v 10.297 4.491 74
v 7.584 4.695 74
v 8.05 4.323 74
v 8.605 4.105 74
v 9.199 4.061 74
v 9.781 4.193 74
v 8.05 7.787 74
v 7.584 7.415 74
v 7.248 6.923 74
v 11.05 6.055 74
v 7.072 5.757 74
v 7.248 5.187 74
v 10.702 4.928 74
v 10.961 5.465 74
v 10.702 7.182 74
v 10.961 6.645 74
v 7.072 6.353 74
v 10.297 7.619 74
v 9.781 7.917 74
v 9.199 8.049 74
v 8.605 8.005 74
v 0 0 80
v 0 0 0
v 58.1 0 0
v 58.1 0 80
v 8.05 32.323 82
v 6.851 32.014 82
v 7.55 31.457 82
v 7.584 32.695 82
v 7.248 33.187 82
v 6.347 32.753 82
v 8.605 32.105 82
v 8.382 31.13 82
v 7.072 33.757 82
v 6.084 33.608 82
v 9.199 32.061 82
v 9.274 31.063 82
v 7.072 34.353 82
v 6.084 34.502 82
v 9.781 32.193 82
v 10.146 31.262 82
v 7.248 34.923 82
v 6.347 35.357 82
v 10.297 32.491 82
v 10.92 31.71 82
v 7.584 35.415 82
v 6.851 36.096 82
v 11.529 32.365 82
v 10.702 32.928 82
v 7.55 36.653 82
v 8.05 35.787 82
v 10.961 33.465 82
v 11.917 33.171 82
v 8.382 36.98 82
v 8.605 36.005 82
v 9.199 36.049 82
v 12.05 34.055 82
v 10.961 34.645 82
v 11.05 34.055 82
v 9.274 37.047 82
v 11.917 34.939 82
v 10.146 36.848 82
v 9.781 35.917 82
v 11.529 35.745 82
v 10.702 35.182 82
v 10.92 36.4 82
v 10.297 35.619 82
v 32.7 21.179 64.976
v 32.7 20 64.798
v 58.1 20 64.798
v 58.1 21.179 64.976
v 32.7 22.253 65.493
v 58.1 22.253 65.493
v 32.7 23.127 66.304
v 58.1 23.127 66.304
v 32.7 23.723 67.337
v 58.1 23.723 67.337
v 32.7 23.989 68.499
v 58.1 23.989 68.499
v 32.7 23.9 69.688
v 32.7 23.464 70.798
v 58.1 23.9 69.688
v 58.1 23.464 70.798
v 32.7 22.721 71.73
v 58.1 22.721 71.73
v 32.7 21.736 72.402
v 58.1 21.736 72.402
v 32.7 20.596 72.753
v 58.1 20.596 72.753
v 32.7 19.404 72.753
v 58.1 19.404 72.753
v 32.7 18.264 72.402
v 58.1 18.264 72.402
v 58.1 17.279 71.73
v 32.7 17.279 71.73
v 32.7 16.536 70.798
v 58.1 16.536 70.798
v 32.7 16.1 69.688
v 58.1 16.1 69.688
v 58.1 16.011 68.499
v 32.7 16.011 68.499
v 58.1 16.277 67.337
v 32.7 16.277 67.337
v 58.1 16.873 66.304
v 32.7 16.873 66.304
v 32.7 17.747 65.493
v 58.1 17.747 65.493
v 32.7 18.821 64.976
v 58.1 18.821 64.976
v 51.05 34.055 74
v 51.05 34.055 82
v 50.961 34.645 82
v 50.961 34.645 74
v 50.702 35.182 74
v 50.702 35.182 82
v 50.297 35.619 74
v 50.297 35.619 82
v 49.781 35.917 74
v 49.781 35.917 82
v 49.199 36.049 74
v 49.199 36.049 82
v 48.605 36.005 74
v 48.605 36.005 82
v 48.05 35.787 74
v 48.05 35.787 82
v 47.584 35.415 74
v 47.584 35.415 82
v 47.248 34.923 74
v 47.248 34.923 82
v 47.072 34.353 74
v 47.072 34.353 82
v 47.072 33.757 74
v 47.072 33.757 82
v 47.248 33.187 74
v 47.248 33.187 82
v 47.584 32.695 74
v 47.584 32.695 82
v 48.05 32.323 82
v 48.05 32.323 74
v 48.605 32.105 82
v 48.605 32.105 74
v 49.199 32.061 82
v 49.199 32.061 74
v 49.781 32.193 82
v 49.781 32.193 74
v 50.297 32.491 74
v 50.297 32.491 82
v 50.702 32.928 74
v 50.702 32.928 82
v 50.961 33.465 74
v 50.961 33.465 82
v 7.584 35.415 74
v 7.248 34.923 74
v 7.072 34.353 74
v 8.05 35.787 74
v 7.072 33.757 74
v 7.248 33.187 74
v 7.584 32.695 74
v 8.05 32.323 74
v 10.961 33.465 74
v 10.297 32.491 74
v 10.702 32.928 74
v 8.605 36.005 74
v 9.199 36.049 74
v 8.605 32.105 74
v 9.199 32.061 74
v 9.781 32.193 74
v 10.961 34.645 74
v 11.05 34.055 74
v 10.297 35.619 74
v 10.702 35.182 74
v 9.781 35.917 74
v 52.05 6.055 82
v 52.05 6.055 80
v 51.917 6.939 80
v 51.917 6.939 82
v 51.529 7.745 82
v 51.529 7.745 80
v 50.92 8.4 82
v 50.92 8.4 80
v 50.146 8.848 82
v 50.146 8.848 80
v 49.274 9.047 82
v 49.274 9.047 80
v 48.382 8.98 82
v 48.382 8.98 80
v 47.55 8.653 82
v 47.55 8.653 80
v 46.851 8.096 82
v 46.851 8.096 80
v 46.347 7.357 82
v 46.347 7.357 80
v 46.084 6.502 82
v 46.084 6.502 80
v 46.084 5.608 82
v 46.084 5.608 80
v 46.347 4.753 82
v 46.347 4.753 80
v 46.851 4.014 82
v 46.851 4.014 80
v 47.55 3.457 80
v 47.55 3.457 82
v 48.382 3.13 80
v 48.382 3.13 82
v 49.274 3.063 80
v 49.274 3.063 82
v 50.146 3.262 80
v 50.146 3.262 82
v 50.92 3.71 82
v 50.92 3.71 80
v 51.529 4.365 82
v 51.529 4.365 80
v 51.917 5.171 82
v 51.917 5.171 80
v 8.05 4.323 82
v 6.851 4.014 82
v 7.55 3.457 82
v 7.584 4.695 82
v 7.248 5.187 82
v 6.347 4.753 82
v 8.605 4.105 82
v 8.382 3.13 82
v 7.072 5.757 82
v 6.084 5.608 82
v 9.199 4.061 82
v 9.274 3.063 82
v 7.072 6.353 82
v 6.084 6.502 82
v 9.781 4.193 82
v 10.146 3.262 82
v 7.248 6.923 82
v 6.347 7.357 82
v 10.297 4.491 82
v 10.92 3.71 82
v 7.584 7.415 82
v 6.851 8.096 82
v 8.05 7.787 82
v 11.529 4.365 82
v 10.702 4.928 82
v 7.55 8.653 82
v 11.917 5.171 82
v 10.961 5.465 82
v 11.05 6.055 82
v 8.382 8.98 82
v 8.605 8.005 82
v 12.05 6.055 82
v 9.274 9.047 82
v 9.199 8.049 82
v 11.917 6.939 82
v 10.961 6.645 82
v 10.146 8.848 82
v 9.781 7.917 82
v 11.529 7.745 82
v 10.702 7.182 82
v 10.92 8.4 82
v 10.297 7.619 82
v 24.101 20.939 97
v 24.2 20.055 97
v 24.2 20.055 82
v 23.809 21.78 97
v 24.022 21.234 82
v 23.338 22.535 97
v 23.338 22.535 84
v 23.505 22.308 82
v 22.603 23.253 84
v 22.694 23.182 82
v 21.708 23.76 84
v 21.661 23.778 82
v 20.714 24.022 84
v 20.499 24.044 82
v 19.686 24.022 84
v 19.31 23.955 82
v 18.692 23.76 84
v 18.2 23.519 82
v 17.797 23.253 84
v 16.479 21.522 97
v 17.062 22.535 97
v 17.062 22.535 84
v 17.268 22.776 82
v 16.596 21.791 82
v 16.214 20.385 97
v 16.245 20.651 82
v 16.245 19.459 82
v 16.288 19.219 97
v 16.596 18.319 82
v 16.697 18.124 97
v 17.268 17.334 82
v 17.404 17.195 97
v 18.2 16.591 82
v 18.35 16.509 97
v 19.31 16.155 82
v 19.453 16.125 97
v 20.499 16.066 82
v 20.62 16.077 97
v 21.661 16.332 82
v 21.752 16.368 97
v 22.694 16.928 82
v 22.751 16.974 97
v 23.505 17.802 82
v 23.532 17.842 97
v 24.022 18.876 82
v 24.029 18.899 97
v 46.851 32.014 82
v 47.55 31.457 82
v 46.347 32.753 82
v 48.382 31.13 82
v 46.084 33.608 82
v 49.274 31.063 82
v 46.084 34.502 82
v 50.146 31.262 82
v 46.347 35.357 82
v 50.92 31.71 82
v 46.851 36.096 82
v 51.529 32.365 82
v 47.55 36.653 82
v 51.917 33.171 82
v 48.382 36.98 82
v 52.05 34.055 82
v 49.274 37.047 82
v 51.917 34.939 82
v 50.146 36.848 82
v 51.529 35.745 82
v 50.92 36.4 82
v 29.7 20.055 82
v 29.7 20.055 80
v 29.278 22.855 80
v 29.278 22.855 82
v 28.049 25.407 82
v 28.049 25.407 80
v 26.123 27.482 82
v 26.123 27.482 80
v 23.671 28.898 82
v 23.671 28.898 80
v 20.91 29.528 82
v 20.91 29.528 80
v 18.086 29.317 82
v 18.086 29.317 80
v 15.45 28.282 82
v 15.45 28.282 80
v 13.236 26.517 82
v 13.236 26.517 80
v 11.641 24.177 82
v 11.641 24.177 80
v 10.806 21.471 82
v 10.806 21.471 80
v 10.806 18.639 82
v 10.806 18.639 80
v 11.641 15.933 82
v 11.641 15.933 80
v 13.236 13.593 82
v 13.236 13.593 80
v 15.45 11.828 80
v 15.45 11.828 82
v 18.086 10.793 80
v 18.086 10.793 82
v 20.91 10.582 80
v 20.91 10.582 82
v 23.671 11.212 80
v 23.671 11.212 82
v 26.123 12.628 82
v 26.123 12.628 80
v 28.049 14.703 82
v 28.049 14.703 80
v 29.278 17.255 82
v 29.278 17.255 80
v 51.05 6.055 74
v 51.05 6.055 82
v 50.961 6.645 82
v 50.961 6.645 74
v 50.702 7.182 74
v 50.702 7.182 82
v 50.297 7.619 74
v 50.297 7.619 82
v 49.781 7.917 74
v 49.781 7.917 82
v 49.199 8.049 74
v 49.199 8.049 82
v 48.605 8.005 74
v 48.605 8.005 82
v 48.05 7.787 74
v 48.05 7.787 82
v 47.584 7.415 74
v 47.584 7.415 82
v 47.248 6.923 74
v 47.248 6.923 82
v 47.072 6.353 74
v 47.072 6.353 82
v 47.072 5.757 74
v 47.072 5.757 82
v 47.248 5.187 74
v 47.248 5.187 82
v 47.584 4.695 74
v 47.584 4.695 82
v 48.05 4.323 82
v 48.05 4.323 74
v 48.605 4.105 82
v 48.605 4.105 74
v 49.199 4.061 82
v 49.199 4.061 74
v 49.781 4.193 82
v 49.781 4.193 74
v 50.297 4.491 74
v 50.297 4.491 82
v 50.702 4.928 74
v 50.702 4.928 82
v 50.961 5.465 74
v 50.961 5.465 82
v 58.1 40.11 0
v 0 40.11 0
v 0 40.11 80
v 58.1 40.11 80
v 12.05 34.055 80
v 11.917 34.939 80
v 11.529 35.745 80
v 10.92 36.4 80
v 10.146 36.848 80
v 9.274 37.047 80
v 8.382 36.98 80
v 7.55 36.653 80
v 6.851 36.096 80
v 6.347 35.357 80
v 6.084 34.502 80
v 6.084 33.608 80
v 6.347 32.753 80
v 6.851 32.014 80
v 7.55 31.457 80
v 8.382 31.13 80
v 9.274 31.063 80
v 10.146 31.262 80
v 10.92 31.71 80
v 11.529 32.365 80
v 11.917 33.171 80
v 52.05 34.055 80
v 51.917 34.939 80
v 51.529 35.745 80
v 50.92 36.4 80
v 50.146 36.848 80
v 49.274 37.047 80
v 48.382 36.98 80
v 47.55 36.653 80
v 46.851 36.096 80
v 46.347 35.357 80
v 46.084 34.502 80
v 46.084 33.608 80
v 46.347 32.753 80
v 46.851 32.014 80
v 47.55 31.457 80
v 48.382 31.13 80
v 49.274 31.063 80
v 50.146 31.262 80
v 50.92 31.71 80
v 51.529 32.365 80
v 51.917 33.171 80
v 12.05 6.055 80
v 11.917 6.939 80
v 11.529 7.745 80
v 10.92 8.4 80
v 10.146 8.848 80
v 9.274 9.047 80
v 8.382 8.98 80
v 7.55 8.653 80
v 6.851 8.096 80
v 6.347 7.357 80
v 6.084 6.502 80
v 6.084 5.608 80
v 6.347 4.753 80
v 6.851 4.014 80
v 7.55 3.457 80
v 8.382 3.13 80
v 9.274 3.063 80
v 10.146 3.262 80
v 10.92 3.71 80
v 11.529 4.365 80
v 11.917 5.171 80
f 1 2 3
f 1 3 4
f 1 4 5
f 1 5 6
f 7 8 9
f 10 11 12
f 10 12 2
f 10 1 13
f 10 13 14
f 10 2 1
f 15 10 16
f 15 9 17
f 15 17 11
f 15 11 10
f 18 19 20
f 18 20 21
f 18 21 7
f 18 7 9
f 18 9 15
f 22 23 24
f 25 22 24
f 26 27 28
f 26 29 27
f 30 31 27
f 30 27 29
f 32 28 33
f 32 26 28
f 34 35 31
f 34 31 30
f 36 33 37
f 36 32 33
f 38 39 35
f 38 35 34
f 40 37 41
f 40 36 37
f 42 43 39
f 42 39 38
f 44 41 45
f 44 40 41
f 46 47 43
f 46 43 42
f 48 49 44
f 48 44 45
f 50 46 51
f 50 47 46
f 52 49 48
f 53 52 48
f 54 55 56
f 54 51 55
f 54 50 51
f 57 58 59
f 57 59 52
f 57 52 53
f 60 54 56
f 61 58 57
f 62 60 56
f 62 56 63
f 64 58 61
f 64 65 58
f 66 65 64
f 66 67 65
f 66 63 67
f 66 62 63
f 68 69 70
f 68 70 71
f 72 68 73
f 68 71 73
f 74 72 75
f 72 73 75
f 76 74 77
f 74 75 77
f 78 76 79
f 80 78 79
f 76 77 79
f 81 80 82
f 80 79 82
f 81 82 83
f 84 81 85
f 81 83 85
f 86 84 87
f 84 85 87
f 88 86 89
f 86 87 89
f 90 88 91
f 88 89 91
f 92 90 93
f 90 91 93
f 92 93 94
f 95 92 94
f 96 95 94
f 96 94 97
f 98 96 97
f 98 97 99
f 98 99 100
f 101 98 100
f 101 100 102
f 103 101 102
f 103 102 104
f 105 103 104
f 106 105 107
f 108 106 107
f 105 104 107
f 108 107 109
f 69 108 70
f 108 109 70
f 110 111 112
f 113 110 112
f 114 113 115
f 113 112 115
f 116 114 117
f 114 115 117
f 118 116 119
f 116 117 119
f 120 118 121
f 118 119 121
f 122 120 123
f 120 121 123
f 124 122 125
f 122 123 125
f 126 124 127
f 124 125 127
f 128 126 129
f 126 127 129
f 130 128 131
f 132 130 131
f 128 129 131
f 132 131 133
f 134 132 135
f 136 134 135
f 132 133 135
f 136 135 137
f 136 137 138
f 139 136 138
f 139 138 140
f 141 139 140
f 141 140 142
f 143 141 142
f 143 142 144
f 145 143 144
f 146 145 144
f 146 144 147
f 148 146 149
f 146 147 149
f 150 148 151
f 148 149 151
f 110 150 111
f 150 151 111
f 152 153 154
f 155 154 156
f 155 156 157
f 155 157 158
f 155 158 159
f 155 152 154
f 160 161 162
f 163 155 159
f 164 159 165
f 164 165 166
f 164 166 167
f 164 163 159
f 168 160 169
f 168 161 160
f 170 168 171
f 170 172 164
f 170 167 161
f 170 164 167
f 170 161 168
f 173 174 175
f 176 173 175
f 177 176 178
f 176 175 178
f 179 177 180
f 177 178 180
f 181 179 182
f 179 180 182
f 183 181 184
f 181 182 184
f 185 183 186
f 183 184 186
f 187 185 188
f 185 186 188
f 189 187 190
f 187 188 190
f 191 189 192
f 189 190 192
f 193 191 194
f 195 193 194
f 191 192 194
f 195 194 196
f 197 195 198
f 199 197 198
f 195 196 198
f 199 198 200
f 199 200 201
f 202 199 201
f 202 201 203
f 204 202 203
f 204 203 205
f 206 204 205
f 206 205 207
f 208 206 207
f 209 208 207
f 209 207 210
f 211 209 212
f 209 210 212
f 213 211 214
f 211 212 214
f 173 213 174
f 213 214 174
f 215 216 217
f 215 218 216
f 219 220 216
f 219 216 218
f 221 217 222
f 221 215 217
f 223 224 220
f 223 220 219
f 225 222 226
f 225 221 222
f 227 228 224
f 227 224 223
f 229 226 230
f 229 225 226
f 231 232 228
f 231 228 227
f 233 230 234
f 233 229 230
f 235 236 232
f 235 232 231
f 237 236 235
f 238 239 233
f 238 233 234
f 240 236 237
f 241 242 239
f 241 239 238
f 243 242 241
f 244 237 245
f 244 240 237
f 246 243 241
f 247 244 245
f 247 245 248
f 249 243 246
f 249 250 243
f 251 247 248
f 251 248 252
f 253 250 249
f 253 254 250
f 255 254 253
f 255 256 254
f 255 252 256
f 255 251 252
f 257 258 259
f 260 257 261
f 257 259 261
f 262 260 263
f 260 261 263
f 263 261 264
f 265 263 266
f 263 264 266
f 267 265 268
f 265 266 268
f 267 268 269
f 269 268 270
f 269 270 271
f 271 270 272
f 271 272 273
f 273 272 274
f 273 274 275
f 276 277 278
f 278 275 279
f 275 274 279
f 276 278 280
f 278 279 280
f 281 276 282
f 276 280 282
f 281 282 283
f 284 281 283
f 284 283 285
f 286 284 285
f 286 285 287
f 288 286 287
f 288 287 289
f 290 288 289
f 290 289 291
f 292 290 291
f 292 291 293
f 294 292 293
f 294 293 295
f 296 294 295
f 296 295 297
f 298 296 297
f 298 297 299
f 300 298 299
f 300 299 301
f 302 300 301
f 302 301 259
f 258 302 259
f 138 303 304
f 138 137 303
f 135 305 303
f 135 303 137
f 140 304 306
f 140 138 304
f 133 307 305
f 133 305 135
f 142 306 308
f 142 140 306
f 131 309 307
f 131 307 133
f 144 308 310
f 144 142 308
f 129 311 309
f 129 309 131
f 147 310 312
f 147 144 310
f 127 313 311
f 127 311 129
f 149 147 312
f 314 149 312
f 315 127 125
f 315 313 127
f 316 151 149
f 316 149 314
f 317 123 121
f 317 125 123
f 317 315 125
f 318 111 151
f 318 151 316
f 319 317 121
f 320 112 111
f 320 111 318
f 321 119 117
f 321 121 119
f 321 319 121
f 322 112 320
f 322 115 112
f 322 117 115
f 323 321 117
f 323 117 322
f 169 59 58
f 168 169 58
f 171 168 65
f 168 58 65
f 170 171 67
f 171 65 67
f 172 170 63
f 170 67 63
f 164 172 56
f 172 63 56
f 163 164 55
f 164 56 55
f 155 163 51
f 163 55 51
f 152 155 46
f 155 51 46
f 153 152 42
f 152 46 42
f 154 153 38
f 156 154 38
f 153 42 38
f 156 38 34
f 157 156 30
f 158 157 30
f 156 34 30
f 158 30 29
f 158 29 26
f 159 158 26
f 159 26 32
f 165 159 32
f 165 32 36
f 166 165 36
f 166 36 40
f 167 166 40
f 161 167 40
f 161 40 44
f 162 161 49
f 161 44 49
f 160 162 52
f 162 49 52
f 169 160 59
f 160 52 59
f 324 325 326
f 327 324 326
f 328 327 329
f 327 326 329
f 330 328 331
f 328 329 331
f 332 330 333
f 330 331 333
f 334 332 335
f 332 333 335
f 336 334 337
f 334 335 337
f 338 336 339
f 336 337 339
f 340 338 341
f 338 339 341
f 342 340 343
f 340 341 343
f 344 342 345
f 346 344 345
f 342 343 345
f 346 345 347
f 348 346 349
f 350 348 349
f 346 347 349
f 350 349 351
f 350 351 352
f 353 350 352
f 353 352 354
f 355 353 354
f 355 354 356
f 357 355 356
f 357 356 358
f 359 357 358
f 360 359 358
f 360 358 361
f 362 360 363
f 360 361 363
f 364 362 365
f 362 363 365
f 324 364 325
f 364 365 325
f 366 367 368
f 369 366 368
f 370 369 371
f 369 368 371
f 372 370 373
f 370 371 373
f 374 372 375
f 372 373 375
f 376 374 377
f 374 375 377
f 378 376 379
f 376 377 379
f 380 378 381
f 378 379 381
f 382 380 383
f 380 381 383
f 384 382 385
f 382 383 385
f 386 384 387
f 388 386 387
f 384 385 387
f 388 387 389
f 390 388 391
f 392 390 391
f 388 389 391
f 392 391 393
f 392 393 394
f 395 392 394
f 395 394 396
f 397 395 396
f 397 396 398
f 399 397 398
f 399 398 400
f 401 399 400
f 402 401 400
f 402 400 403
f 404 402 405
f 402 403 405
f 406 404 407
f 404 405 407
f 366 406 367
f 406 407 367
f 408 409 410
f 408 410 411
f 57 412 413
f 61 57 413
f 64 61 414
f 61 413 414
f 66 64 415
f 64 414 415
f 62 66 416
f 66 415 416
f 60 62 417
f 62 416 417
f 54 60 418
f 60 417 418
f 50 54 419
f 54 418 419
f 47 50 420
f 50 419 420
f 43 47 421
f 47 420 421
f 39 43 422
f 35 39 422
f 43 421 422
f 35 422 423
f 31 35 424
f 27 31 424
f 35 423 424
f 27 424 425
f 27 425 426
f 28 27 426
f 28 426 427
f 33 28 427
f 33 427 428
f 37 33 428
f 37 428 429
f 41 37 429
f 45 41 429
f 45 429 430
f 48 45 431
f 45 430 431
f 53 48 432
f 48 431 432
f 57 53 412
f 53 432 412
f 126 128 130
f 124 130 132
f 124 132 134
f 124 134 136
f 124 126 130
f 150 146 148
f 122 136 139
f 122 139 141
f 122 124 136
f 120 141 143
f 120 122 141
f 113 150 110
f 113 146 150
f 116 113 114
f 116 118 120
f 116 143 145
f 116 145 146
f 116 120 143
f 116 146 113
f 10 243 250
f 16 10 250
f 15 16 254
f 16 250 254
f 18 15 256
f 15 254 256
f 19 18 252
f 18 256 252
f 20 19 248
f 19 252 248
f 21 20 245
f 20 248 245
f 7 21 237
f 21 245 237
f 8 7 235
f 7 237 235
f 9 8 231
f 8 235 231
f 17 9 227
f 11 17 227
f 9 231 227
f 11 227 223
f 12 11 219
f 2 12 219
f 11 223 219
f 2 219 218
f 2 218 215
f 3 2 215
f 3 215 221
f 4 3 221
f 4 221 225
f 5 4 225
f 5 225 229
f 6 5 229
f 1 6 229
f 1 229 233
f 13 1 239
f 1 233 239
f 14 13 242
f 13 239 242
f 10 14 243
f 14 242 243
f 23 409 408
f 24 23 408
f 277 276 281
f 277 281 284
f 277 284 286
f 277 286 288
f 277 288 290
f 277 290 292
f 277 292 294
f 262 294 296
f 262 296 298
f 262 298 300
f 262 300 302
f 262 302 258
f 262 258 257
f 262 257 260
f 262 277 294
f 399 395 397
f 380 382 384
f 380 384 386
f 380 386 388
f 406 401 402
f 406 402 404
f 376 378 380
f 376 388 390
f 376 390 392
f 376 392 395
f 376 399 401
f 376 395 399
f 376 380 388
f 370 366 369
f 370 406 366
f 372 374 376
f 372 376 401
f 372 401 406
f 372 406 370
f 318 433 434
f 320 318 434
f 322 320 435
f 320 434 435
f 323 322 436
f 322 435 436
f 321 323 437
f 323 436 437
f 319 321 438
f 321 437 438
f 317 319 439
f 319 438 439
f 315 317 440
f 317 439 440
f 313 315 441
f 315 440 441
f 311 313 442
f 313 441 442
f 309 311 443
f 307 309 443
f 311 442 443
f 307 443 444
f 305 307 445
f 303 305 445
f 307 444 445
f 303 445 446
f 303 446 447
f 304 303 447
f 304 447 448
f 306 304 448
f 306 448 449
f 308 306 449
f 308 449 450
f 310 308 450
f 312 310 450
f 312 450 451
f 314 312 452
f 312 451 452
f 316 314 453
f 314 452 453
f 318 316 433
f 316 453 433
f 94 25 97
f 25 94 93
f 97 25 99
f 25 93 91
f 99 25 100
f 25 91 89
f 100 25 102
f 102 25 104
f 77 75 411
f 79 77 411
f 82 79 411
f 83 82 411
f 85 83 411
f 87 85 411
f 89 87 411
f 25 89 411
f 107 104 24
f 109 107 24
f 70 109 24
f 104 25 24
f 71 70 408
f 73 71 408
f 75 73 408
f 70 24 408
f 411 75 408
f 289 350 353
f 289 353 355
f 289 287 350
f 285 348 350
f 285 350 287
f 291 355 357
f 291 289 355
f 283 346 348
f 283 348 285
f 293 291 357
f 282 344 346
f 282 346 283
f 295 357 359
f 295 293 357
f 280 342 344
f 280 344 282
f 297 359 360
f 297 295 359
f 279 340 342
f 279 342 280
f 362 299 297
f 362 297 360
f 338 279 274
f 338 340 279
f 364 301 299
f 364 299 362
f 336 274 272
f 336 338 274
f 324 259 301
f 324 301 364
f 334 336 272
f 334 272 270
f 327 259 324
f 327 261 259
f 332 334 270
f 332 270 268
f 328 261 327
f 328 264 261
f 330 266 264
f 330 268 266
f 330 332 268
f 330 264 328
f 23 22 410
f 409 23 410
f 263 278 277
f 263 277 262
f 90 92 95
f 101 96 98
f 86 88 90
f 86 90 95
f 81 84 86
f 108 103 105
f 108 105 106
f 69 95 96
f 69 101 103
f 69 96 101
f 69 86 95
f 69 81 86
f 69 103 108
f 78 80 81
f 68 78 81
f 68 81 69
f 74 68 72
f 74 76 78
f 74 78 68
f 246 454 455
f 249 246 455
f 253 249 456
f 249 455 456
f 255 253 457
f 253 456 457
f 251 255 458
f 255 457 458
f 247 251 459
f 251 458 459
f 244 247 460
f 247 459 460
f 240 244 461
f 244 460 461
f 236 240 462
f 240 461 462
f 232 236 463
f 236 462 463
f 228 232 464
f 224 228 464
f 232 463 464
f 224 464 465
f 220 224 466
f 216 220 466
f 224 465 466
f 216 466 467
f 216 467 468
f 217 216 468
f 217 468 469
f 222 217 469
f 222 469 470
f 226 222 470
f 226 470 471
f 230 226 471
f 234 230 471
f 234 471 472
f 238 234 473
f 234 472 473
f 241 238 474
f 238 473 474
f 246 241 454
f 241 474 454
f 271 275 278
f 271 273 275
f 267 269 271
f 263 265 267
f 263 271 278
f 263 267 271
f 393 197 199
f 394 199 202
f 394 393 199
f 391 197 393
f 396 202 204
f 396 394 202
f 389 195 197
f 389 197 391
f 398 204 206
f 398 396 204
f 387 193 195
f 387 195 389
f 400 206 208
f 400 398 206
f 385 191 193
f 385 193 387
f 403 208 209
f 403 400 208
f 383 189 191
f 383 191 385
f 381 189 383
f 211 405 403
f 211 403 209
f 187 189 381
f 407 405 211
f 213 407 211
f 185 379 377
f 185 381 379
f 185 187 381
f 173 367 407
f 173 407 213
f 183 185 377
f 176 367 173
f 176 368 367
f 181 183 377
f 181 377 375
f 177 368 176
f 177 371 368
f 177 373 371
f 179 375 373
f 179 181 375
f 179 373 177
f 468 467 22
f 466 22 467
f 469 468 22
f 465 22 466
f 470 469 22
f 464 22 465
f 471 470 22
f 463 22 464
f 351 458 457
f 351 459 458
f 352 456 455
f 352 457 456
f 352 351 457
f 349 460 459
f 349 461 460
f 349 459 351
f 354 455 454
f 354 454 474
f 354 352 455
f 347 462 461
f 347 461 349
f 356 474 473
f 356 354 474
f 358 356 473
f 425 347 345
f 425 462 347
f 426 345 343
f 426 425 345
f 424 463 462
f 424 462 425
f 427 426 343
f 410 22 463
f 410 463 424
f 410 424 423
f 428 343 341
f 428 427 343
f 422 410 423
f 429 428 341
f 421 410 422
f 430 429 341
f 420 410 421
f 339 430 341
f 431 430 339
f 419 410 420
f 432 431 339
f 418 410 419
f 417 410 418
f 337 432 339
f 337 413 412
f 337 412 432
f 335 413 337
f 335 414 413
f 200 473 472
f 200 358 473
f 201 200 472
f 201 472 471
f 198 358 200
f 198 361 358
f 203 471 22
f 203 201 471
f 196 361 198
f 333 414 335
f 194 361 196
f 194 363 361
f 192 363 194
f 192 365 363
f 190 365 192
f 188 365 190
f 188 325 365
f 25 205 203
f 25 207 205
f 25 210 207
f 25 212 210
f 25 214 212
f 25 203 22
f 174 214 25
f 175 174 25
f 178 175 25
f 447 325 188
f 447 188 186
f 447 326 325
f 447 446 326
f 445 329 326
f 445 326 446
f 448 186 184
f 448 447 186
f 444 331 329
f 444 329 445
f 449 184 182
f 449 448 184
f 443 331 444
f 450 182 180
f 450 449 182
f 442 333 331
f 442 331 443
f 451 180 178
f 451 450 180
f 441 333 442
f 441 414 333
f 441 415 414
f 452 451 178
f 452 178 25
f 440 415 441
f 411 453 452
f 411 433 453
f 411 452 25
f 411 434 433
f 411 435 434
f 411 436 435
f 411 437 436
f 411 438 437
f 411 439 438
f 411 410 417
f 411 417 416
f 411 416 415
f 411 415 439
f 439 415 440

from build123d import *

# Parameters (mm, degrees)
SKETCH1_W           = 58.1
SKETCH1_H           = 40.11
BOSS_EXTRUDE1_DEPTH = 80
SKETCH2_R           = 9.5
BOSS_EXTRUDE2_DEPTH = 2
SKETCH3_R           = 4
BOSS_EXTRUDE3_DEPTH = 15
SKETCH4_W           = 6.276876118
SKETCH4_H           = 1.998885949
CUT_EXTRUDE1_DEPTH  = 13
SKETCH5_R           = 3
BOSS_EXTRUDE4_DEPTH = 2
SKETCH6_R           = 2
CUT_EXTRUDE2_DEPTH  = 8
SKETCH7_R           = 4
CUT_EXTRUDE3_DEPTH  = 25.4


with BuildPart() as part:
    # Sketch1 → Boss-Extrude1 (new body)
    with BuildSketch(Plane.XY):
        with Locations((29.05, 20.055)):
            Rectangle(SKETCH1_W, SKETCH1_H)
    extrude(amount=BOSS_EXTRUDE1_DEPTH)

    # Sketch2 → Boss-Extrude2 (add)
    with BuildSketch(Plane.XY.offset(80)):
        with Locations((20.2, 20.055)):
            Circle(SKETCH2_R)
    extrude(amount=BOSS_EXTRUDE2_DEPTH)

    # Sketch3 → Boss-Extrude3 (add)
    with BuildSketch(Plane.XY.offset(82)):
        with Locations((20.2, 20.055)):
            Circle(SKETCH3_R)
    extrude(amount=BOSS_EXTRUDE3_DEPTH)

    # Sketch4 → Cut-Extrude1 (cut)
    with BuildSketch(Plane.XY.offset(97)):
        with Locations((20.2, 23.534403972)):
            Rectangle(SKETCH4_W, SKETCH4_H)
    extrude(amount=-CUT_EXTRUDE1_DEPTH, mode=Mode.SUBTRACT)

    # Sketch5 → Boss-Extrude4 (add)
    with BuildSketch(Plane.XY.offset(80)):
        with Locations((9.05, 34.055)):
            Circle(SKETCH5_R)
        with Locations((49.05, 34.055)):
            Circle(SKETCH5_R)
        with Locations((49.05, 6.055)):
            Circle(SKETCH5_R)
        with Locations((9.05, 6.055)):
            Circle(SKETCH5_R)
    extrude(amount=BOSS_EXTRUDE4_DEPTH)

    # Sketch6 → Cut-Extrude2 (cut)
    with BuildSketch(Plane.XY.offset(82)):
        with Locations((9.05, 34.055)):
            Circle(SKETCH6_R)
        with Locations((49.05, 34.055)):
            Circle(SKETCH6_R)
        with Locations((49.05, 6.055)):
            Circle(SKETCH6_R)
        with Locations((9.05, 6.055)):
            Circle(SKETCH6_R)
    extrude(amount=-CUT_EXTRUDE2_DEPTH, mode=Mode.SUBTRACT)

    # Sketch7 → Cut-Extrude3 (cut)
    with BuildSketch(Plane(origin=(58.1, 0, 0), x_dir=(0, 0, -1), z_dir=(1, 0, 0))):
        with Locations((-68.797911108, 20)):
            Circle(SKETCH7_R)
    extrude(amount=-CUT_EXTRUDE3_DEPTH, mode=Mode.SUBTRACT)


solid = part.part
